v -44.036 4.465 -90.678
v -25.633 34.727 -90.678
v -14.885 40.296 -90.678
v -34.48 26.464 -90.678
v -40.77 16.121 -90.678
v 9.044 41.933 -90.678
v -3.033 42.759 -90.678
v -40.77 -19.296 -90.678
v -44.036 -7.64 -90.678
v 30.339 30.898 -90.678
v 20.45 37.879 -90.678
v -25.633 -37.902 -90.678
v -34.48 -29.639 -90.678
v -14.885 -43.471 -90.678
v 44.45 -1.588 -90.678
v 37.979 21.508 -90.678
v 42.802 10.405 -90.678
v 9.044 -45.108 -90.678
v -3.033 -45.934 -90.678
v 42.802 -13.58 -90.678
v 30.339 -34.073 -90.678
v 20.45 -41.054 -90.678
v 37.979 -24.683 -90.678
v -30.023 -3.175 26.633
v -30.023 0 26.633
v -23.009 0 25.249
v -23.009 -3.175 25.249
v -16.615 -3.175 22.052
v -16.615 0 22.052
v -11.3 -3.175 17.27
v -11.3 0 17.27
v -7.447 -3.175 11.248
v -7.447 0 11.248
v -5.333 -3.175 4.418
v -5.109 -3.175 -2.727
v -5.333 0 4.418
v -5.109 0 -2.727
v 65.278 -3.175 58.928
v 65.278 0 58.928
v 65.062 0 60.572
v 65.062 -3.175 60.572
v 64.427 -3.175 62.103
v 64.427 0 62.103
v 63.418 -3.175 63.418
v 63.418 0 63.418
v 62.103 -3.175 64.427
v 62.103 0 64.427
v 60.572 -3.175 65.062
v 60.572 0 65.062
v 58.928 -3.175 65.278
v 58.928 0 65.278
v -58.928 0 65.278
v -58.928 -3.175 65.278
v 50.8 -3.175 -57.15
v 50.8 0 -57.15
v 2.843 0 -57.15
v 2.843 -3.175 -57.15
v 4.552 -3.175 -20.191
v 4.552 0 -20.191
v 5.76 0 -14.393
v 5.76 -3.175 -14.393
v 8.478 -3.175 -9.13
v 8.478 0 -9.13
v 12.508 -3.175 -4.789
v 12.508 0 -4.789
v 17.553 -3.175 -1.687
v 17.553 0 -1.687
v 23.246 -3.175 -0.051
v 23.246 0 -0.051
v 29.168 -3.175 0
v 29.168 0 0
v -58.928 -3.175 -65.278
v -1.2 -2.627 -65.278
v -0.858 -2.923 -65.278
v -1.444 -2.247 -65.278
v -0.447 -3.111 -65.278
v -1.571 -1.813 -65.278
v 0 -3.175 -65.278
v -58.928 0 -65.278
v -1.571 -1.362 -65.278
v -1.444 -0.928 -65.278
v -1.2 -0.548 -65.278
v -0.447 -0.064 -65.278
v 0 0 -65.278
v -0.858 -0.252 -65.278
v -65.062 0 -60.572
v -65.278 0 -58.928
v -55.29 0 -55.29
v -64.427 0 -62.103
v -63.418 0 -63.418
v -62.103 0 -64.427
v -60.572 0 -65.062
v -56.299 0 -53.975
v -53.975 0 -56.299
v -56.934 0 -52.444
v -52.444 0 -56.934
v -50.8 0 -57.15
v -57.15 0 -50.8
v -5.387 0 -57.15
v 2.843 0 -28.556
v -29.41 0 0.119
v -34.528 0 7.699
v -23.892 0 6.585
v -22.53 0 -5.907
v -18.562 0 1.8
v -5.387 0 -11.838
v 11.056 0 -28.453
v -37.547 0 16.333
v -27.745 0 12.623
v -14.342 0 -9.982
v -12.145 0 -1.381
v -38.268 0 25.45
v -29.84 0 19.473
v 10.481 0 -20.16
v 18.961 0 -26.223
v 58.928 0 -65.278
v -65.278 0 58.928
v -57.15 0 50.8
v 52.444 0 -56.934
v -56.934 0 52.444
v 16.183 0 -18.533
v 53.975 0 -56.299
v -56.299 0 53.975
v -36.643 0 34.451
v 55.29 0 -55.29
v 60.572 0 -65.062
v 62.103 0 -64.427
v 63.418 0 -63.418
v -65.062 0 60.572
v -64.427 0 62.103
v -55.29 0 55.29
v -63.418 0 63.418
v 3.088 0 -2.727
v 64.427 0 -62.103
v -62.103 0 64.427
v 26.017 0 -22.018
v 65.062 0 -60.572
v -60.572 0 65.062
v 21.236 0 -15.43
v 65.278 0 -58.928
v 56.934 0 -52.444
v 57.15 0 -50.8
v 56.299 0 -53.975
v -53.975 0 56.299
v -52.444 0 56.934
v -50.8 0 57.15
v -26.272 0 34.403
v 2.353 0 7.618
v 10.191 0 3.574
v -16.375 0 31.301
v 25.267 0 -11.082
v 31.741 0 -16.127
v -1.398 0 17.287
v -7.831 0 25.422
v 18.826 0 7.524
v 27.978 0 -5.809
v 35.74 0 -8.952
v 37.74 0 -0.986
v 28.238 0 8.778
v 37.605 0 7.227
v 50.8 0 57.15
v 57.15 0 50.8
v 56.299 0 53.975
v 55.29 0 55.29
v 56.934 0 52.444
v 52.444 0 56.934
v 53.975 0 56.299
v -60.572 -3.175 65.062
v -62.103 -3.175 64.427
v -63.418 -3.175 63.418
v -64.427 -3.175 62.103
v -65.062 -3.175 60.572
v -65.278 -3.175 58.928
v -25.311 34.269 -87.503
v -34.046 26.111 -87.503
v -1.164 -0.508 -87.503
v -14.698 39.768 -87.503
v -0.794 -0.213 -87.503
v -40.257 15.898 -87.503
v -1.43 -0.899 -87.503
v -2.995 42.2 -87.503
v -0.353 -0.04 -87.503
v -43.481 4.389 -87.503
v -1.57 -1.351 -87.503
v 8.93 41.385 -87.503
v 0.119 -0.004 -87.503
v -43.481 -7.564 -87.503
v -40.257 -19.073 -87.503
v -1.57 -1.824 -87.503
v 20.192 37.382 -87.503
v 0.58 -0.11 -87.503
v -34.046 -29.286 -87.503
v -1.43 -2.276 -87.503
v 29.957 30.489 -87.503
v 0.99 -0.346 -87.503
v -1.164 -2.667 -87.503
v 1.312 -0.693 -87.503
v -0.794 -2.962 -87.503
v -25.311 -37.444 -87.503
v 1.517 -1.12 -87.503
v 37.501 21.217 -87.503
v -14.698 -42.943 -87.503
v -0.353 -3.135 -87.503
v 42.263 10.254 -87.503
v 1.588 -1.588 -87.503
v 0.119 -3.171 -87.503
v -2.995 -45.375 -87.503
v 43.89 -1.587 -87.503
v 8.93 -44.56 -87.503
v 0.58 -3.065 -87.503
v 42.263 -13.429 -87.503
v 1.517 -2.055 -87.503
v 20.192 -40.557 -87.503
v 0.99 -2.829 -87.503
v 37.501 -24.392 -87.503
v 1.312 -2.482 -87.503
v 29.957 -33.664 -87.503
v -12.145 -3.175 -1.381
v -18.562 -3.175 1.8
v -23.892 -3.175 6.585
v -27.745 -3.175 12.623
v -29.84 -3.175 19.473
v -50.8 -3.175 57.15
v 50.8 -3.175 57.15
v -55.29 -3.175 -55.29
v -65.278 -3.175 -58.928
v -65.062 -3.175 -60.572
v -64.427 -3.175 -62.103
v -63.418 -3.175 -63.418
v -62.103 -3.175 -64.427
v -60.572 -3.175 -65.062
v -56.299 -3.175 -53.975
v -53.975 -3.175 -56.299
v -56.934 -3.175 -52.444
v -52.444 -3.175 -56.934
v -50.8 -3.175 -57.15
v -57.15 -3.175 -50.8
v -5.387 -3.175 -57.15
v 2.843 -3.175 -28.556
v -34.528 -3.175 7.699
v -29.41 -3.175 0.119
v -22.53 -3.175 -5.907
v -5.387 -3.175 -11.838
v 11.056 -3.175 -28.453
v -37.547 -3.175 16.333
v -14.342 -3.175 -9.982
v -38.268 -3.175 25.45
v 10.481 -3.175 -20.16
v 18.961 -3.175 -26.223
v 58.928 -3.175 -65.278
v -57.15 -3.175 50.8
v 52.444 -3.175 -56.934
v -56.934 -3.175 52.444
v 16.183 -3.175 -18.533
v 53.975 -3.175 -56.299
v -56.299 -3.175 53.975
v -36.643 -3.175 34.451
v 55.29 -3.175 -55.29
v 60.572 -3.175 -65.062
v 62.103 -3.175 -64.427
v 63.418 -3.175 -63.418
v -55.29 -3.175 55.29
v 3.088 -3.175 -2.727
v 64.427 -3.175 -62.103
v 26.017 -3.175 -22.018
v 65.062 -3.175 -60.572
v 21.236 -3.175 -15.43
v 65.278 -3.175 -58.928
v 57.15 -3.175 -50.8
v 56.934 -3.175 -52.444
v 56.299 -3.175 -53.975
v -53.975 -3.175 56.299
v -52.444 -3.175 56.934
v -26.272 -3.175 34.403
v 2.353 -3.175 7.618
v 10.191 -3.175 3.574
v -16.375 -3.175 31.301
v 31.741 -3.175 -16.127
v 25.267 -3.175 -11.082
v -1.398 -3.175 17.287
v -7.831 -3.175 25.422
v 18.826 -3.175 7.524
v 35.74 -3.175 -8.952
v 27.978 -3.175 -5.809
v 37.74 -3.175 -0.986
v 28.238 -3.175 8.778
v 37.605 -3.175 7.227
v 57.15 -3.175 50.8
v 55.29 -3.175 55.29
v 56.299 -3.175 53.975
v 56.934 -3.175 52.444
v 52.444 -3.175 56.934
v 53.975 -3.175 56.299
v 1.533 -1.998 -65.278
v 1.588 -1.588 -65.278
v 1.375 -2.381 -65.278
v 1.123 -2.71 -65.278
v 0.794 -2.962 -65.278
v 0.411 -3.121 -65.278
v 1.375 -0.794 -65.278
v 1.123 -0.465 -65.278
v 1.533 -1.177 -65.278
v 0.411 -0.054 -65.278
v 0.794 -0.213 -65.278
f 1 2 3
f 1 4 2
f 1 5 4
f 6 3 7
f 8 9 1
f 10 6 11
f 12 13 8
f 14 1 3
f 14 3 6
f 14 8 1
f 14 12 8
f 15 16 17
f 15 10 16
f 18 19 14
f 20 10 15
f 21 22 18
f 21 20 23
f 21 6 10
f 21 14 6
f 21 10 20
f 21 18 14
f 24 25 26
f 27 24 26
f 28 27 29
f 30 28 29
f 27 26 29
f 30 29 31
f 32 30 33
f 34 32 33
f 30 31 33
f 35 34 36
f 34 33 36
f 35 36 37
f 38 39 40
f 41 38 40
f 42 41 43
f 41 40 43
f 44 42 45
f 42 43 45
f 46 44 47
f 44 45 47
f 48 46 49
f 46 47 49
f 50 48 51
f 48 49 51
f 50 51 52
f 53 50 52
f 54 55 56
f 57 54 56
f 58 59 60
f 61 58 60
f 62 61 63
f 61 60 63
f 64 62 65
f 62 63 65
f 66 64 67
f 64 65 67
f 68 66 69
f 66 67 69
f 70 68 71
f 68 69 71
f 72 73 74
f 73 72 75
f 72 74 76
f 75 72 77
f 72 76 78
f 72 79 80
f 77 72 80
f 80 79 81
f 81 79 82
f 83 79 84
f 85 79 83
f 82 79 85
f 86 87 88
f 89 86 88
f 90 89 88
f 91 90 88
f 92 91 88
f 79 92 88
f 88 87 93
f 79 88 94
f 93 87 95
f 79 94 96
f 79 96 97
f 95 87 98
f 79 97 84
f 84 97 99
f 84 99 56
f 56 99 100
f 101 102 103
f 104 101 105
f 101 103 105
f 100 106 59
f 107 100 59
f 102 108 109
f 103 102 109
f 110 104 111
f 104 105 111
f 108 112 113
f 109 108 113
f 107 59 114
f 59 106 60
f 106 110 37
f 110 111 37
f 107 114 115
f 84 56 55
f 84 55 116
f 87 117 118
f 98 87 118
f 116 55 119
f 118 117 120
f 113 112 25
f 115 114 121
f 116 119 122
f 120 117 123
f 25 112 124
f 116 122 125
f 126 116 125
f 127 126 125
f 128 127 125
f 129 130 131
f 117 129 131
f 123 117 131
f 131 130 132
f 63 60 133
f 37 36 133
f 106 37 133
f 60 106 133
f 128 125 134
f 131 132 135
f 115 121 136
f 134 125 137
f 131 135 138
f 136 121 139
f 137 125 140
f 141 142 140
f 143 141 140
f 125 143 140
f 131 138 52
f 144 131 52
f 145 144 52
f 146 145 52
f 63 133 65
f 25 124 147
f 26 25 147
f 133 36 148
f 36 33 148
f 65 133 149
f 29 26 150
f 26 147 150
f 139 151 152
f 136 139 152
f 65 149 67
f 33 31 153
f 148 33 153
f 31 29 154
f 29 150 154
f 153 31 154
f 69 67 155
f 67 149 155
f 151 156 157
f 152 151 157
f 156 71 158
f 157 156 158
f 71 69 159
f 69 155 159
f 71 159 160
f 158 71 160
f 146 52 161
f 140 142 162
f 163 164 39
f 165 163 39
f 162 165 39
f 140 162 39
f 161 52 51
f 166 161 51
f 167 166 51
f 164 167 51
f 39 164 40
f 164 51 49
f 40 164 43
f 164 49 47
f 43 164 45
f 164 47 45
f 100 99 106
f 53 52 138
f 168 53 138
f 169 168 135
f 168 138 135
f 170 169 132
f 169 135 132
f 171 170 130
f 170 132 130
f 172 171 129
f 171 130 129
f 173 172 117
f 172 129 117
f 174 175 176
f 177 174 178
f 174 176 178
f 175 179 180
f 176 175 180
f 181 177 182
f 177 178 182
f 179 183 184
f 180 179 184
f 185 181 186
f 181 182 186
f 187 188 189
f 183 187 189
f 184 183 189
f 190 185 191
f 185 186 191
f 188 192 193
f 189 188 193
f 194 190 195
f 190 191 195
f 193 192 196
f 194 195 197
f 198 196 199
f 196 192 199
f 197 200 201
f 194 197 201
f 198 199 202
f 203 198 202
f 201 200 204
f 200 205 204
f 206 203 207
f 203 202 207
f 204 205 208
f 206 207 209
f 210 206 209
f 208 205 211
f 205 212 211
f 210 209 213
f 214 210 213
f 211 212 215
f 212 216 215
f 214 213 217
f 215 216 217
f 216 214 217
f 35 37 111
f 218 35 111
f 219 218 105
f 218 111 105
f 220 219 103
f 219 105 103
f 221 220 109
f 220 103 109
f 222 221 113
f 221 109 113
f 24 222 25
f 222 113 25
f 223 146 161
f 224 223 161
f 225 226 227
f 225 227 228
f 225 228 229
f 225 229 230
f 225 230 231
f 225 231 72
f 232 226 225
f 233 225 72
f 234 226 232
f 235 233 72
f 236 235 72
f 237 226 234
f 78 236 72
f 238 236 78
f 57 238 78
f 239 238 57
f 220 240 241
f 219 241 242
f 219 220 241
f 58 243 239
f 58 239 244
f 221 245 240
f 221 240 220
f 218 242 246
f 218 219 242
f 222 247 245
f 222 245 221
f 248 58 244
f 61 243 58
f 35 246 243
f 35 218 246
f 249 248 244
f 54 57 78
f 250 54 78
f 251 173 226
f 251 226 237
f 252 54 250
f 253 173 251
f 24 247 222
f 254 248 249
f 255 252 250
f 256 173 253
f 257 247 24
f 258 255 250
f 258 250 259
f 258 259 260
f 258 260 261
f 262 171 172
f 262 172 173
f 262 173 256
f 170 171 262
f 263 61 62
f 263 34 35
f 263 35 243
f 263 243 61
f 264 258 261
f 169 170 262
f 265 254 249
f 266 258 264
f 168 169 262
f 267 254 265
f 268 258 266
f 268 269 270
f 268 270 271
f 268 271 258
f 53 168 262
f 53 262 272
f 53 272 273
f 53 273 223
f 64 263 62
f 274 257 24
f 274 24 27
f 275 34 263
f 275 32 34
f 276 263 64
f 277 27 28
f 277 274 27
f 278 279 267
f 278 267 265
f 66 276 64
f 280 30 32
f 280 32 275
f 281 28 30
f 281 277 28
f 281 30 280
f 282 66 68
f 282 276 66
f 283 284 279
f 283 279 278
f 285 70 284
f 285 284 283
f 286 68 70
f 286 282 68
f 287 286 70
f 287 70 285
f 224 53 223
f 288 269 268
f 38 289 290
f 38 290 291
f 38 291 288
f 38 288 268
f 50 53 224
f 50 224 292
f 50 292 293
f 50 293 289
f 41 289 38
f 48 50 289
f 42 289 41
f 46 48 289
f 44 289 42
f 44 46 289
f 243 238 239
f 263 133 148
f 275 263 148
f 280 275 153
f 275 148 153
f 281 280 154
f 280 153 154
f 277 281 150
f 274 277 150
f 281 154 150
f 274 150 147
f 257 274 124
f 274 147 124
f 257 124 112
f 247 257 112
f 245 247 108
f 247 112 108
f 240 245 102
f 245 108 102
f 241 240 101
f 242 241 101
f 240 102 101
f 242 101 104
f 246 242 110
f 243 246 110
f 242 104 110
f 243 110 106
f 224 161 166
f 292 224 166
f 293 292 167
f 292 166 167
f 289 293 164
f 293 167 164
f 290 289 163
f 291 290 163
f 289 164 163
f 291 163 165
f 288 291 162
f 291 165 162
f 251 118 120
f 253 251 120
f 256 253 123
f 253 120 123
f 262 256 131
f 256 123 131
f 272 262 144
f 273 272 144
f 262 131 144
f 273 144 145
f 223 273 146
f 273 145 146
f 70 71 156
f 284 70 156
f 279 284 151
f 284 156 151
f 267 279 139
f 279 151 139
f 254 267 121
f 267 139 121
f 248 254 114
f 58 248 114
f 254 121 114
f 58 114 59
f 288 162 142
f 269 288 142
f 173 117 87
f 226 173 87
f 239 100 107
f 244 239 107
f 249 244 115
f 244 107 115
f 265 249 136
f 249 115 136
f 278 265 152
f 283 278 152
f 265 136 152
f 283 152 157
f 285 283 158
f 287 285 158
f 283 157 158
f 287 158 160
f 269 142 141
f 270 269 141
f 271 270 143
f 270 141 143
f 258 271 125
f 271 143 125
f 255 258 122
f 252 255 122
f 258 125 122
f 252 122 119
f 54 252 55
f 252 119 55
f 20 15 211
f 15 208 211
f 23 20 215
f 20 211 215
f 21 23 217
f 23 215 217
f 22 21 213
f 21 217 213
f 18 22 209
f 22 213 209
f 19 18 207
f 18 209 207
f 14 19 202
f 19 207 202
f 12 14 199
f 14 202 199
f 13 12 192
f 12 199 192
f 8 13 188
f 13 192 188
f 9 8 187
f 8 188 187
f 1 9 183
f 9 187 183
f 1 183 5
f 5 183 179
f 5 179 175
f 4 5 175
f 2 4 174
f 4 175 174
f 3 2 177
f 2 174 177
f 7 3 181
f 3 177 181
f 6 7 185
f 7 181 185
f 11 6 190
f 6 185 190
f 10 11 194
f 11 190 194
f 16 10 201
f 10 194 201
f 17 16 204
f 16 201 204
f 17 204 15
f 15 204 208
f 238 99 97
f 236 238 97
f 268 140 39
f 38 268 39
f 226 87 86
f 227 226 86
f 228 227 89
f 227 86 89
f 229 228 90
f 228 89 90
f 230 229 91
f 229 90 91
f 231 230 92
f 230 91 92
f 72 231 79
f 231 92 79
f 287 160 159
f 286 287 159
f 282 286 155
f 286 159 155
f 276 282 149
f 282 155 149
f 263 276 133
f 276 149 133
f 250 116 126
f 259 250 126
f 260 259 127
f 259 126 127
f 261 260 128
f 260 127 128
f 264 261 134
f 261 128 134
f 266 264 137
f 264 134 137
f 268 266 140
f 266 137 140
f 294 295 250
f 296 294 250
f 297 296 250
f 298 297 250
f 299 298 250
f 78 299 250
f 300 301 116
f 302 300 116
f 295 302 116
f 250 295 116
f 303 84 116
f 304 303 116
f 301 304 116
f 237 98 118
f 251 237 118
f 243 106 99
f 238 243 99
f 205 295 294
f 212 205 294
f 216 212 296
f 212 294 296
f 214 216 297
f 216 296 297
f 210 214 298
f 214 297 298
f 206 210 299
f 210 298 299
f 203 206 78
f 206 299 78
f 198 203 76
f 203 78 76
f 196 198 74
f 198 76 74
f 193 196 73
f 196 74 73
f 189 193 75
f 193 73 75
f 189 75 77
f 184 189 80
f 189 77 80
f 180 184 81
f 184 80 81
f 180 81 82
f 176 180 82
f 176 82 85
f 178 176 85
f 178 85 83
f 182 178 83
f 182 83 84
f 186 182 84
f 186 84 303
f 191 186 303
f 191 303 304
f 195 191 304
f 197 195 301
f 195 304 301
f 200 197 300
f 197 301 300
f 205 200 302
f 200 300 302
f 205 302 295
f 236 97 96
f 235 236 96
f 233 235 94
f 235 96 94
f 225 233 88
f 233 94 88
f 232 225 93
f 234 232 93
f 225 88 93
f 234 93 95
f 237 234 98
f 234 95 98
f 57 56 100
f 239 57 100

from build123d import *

# Parameters (mm, degrees)
F2_DEPTH = 3.175
F3_R     = 1.5875
F4_DEPTH = 25.4
F5_R     = 44.45
F6_DEPTH = 3.175
F6_TAPER = 10


# Not quite as in the source:
# - a feature of the source that left no trace in its solid (it failed there, or was rolled back) is left out


with BuildPart() as f2:
    # F1 (on Front) → F2 (new body)
    with BuildSketch(Plane.XZ):
        with BuildLine():
            Line((58.928, 65.278), (-58.928, 65.278))
            ThreePointArc((-58.928, 65.278), (-63.4181280605, 63.4181280605), (-65.278, 58.928))
            Line((-65.278, 58.928), (-65.278, -58.928))
            ThreePointArc((-65.278, -58.928), (-63.4181280605, -63.4181280605), (-58.928, -65.278))
            Line((-58.928, -65.278), (58.928, -65.278))
            ThreePointArc((58.928, -65.278), (63.4181280605, -63.4181280605), (65.278, -58.928))
            Line((65.278, -58.928), (65.278, 58.928))
            ThreePointArc((65.278, 58.928), (63.4181280605, 63.4181280605), (58.928, 65.278))
        make_face()
        with BuildLine():
            ThreePointArc((29.1683860123, 0), (21.2359008795, -15.4304684341), (4.5518055526, -20.1912078303))
            ThreePointArc((4.5518055526, -20.1912078303), (12.5076591177, -4.7892295638), (29.1683860123, 0))
        make_face(mode=Mode.SUBTRACT)
        with BuildLine():
            ThreePointArc((-30.0225467432, 26.633475086), (-11.3001914874, 17.269662026), (-5.1093608776, -2.7273676961))
            ThreePointArc((-5.1093608776, -2.7273676961), (-23.8921161087, 6.5851949341), (-30.0225467432, 26.633475086))
        make_face(mode=Mode.SUBTRACT)
        with BuildLine():
            Line((-5.3865113296, -11.8381703437), (-5.3865113296, -57.15))
            Line((-5.3865113296, -57.15), (-50.8, -57.15))
            ThreePointArc((-50.8, -57.15), (-55.2901280605, -55.2901280605), (-57.15, -50.8))
            Line((-57.15, -50.8), (-57.15, 50.8))
            ThreePointArc((-57.15, 50.8), (-55.2901280605, 55.2901280605), (-50.8, 57.15))
            Line((-50.8, 57.15), (50.8, 57.15))
            ThreePointArc((50.8, 57.15), (55.2901280605, 55.2901280605), (57.15, 50.8))
            Line((57.15, 50.8), (57.15, -50.8))
            ThreePointArc((57.15, -50.8), (55.2901280605, -55.2901280605), (50.8, -57.15))
            Line((50.8, -57.15), (2.8426104691, -57.15))
            Line((2.8426104691, -57.15), (2.8426104691, -28.5558674872))
            ThreePointArc((2.8426104691, -28.5558674872), (29.0723668952, -19.260680993), (37.6052677218, 7.2268673576))
            ThreePointArc((37.6052677218, 7.2268673576), (18.8257654598, 7.524261984), (3.0884773301, -2.7273676961))
            ThreePointArc((3.0884773301, -2.7273676961), (-7.830876963, 25.422268659), (-36.6427004337, 34.4507321715))
            ThreePointArc((-36.6427004337, 34.4507321715), (-32.213387286, 3.7443986853), (-5.3865113296, -11.8381703437))
        make_face(mode=Mode.SUBTRACT)
    extrude(amount=F2_DEPTH)

    # F3 (on face) → F4 (join)
    with BuildSketch(Plane(origin=(0, 0, -65.278), x_dir=(1, 0, 0), z_dir=(0, 0, -1))):
        with Locations((0, 1.5875)):
            Circle(F3_R)
    extrude(amount=F4_DEPTH)

    # F5 (on face) → F6 (join)
    with BuildSketch(Plane(origin=(0, 0, -90.678), x_dir=(1, 0, 0), z_dir=(0, 0, -1))):
        with Locations((0, 1.5875)):
            Circle(F5_R)
    extrude(amount=-F6_DEPTH, taper=F6_TAPER)


solid = f2.part
